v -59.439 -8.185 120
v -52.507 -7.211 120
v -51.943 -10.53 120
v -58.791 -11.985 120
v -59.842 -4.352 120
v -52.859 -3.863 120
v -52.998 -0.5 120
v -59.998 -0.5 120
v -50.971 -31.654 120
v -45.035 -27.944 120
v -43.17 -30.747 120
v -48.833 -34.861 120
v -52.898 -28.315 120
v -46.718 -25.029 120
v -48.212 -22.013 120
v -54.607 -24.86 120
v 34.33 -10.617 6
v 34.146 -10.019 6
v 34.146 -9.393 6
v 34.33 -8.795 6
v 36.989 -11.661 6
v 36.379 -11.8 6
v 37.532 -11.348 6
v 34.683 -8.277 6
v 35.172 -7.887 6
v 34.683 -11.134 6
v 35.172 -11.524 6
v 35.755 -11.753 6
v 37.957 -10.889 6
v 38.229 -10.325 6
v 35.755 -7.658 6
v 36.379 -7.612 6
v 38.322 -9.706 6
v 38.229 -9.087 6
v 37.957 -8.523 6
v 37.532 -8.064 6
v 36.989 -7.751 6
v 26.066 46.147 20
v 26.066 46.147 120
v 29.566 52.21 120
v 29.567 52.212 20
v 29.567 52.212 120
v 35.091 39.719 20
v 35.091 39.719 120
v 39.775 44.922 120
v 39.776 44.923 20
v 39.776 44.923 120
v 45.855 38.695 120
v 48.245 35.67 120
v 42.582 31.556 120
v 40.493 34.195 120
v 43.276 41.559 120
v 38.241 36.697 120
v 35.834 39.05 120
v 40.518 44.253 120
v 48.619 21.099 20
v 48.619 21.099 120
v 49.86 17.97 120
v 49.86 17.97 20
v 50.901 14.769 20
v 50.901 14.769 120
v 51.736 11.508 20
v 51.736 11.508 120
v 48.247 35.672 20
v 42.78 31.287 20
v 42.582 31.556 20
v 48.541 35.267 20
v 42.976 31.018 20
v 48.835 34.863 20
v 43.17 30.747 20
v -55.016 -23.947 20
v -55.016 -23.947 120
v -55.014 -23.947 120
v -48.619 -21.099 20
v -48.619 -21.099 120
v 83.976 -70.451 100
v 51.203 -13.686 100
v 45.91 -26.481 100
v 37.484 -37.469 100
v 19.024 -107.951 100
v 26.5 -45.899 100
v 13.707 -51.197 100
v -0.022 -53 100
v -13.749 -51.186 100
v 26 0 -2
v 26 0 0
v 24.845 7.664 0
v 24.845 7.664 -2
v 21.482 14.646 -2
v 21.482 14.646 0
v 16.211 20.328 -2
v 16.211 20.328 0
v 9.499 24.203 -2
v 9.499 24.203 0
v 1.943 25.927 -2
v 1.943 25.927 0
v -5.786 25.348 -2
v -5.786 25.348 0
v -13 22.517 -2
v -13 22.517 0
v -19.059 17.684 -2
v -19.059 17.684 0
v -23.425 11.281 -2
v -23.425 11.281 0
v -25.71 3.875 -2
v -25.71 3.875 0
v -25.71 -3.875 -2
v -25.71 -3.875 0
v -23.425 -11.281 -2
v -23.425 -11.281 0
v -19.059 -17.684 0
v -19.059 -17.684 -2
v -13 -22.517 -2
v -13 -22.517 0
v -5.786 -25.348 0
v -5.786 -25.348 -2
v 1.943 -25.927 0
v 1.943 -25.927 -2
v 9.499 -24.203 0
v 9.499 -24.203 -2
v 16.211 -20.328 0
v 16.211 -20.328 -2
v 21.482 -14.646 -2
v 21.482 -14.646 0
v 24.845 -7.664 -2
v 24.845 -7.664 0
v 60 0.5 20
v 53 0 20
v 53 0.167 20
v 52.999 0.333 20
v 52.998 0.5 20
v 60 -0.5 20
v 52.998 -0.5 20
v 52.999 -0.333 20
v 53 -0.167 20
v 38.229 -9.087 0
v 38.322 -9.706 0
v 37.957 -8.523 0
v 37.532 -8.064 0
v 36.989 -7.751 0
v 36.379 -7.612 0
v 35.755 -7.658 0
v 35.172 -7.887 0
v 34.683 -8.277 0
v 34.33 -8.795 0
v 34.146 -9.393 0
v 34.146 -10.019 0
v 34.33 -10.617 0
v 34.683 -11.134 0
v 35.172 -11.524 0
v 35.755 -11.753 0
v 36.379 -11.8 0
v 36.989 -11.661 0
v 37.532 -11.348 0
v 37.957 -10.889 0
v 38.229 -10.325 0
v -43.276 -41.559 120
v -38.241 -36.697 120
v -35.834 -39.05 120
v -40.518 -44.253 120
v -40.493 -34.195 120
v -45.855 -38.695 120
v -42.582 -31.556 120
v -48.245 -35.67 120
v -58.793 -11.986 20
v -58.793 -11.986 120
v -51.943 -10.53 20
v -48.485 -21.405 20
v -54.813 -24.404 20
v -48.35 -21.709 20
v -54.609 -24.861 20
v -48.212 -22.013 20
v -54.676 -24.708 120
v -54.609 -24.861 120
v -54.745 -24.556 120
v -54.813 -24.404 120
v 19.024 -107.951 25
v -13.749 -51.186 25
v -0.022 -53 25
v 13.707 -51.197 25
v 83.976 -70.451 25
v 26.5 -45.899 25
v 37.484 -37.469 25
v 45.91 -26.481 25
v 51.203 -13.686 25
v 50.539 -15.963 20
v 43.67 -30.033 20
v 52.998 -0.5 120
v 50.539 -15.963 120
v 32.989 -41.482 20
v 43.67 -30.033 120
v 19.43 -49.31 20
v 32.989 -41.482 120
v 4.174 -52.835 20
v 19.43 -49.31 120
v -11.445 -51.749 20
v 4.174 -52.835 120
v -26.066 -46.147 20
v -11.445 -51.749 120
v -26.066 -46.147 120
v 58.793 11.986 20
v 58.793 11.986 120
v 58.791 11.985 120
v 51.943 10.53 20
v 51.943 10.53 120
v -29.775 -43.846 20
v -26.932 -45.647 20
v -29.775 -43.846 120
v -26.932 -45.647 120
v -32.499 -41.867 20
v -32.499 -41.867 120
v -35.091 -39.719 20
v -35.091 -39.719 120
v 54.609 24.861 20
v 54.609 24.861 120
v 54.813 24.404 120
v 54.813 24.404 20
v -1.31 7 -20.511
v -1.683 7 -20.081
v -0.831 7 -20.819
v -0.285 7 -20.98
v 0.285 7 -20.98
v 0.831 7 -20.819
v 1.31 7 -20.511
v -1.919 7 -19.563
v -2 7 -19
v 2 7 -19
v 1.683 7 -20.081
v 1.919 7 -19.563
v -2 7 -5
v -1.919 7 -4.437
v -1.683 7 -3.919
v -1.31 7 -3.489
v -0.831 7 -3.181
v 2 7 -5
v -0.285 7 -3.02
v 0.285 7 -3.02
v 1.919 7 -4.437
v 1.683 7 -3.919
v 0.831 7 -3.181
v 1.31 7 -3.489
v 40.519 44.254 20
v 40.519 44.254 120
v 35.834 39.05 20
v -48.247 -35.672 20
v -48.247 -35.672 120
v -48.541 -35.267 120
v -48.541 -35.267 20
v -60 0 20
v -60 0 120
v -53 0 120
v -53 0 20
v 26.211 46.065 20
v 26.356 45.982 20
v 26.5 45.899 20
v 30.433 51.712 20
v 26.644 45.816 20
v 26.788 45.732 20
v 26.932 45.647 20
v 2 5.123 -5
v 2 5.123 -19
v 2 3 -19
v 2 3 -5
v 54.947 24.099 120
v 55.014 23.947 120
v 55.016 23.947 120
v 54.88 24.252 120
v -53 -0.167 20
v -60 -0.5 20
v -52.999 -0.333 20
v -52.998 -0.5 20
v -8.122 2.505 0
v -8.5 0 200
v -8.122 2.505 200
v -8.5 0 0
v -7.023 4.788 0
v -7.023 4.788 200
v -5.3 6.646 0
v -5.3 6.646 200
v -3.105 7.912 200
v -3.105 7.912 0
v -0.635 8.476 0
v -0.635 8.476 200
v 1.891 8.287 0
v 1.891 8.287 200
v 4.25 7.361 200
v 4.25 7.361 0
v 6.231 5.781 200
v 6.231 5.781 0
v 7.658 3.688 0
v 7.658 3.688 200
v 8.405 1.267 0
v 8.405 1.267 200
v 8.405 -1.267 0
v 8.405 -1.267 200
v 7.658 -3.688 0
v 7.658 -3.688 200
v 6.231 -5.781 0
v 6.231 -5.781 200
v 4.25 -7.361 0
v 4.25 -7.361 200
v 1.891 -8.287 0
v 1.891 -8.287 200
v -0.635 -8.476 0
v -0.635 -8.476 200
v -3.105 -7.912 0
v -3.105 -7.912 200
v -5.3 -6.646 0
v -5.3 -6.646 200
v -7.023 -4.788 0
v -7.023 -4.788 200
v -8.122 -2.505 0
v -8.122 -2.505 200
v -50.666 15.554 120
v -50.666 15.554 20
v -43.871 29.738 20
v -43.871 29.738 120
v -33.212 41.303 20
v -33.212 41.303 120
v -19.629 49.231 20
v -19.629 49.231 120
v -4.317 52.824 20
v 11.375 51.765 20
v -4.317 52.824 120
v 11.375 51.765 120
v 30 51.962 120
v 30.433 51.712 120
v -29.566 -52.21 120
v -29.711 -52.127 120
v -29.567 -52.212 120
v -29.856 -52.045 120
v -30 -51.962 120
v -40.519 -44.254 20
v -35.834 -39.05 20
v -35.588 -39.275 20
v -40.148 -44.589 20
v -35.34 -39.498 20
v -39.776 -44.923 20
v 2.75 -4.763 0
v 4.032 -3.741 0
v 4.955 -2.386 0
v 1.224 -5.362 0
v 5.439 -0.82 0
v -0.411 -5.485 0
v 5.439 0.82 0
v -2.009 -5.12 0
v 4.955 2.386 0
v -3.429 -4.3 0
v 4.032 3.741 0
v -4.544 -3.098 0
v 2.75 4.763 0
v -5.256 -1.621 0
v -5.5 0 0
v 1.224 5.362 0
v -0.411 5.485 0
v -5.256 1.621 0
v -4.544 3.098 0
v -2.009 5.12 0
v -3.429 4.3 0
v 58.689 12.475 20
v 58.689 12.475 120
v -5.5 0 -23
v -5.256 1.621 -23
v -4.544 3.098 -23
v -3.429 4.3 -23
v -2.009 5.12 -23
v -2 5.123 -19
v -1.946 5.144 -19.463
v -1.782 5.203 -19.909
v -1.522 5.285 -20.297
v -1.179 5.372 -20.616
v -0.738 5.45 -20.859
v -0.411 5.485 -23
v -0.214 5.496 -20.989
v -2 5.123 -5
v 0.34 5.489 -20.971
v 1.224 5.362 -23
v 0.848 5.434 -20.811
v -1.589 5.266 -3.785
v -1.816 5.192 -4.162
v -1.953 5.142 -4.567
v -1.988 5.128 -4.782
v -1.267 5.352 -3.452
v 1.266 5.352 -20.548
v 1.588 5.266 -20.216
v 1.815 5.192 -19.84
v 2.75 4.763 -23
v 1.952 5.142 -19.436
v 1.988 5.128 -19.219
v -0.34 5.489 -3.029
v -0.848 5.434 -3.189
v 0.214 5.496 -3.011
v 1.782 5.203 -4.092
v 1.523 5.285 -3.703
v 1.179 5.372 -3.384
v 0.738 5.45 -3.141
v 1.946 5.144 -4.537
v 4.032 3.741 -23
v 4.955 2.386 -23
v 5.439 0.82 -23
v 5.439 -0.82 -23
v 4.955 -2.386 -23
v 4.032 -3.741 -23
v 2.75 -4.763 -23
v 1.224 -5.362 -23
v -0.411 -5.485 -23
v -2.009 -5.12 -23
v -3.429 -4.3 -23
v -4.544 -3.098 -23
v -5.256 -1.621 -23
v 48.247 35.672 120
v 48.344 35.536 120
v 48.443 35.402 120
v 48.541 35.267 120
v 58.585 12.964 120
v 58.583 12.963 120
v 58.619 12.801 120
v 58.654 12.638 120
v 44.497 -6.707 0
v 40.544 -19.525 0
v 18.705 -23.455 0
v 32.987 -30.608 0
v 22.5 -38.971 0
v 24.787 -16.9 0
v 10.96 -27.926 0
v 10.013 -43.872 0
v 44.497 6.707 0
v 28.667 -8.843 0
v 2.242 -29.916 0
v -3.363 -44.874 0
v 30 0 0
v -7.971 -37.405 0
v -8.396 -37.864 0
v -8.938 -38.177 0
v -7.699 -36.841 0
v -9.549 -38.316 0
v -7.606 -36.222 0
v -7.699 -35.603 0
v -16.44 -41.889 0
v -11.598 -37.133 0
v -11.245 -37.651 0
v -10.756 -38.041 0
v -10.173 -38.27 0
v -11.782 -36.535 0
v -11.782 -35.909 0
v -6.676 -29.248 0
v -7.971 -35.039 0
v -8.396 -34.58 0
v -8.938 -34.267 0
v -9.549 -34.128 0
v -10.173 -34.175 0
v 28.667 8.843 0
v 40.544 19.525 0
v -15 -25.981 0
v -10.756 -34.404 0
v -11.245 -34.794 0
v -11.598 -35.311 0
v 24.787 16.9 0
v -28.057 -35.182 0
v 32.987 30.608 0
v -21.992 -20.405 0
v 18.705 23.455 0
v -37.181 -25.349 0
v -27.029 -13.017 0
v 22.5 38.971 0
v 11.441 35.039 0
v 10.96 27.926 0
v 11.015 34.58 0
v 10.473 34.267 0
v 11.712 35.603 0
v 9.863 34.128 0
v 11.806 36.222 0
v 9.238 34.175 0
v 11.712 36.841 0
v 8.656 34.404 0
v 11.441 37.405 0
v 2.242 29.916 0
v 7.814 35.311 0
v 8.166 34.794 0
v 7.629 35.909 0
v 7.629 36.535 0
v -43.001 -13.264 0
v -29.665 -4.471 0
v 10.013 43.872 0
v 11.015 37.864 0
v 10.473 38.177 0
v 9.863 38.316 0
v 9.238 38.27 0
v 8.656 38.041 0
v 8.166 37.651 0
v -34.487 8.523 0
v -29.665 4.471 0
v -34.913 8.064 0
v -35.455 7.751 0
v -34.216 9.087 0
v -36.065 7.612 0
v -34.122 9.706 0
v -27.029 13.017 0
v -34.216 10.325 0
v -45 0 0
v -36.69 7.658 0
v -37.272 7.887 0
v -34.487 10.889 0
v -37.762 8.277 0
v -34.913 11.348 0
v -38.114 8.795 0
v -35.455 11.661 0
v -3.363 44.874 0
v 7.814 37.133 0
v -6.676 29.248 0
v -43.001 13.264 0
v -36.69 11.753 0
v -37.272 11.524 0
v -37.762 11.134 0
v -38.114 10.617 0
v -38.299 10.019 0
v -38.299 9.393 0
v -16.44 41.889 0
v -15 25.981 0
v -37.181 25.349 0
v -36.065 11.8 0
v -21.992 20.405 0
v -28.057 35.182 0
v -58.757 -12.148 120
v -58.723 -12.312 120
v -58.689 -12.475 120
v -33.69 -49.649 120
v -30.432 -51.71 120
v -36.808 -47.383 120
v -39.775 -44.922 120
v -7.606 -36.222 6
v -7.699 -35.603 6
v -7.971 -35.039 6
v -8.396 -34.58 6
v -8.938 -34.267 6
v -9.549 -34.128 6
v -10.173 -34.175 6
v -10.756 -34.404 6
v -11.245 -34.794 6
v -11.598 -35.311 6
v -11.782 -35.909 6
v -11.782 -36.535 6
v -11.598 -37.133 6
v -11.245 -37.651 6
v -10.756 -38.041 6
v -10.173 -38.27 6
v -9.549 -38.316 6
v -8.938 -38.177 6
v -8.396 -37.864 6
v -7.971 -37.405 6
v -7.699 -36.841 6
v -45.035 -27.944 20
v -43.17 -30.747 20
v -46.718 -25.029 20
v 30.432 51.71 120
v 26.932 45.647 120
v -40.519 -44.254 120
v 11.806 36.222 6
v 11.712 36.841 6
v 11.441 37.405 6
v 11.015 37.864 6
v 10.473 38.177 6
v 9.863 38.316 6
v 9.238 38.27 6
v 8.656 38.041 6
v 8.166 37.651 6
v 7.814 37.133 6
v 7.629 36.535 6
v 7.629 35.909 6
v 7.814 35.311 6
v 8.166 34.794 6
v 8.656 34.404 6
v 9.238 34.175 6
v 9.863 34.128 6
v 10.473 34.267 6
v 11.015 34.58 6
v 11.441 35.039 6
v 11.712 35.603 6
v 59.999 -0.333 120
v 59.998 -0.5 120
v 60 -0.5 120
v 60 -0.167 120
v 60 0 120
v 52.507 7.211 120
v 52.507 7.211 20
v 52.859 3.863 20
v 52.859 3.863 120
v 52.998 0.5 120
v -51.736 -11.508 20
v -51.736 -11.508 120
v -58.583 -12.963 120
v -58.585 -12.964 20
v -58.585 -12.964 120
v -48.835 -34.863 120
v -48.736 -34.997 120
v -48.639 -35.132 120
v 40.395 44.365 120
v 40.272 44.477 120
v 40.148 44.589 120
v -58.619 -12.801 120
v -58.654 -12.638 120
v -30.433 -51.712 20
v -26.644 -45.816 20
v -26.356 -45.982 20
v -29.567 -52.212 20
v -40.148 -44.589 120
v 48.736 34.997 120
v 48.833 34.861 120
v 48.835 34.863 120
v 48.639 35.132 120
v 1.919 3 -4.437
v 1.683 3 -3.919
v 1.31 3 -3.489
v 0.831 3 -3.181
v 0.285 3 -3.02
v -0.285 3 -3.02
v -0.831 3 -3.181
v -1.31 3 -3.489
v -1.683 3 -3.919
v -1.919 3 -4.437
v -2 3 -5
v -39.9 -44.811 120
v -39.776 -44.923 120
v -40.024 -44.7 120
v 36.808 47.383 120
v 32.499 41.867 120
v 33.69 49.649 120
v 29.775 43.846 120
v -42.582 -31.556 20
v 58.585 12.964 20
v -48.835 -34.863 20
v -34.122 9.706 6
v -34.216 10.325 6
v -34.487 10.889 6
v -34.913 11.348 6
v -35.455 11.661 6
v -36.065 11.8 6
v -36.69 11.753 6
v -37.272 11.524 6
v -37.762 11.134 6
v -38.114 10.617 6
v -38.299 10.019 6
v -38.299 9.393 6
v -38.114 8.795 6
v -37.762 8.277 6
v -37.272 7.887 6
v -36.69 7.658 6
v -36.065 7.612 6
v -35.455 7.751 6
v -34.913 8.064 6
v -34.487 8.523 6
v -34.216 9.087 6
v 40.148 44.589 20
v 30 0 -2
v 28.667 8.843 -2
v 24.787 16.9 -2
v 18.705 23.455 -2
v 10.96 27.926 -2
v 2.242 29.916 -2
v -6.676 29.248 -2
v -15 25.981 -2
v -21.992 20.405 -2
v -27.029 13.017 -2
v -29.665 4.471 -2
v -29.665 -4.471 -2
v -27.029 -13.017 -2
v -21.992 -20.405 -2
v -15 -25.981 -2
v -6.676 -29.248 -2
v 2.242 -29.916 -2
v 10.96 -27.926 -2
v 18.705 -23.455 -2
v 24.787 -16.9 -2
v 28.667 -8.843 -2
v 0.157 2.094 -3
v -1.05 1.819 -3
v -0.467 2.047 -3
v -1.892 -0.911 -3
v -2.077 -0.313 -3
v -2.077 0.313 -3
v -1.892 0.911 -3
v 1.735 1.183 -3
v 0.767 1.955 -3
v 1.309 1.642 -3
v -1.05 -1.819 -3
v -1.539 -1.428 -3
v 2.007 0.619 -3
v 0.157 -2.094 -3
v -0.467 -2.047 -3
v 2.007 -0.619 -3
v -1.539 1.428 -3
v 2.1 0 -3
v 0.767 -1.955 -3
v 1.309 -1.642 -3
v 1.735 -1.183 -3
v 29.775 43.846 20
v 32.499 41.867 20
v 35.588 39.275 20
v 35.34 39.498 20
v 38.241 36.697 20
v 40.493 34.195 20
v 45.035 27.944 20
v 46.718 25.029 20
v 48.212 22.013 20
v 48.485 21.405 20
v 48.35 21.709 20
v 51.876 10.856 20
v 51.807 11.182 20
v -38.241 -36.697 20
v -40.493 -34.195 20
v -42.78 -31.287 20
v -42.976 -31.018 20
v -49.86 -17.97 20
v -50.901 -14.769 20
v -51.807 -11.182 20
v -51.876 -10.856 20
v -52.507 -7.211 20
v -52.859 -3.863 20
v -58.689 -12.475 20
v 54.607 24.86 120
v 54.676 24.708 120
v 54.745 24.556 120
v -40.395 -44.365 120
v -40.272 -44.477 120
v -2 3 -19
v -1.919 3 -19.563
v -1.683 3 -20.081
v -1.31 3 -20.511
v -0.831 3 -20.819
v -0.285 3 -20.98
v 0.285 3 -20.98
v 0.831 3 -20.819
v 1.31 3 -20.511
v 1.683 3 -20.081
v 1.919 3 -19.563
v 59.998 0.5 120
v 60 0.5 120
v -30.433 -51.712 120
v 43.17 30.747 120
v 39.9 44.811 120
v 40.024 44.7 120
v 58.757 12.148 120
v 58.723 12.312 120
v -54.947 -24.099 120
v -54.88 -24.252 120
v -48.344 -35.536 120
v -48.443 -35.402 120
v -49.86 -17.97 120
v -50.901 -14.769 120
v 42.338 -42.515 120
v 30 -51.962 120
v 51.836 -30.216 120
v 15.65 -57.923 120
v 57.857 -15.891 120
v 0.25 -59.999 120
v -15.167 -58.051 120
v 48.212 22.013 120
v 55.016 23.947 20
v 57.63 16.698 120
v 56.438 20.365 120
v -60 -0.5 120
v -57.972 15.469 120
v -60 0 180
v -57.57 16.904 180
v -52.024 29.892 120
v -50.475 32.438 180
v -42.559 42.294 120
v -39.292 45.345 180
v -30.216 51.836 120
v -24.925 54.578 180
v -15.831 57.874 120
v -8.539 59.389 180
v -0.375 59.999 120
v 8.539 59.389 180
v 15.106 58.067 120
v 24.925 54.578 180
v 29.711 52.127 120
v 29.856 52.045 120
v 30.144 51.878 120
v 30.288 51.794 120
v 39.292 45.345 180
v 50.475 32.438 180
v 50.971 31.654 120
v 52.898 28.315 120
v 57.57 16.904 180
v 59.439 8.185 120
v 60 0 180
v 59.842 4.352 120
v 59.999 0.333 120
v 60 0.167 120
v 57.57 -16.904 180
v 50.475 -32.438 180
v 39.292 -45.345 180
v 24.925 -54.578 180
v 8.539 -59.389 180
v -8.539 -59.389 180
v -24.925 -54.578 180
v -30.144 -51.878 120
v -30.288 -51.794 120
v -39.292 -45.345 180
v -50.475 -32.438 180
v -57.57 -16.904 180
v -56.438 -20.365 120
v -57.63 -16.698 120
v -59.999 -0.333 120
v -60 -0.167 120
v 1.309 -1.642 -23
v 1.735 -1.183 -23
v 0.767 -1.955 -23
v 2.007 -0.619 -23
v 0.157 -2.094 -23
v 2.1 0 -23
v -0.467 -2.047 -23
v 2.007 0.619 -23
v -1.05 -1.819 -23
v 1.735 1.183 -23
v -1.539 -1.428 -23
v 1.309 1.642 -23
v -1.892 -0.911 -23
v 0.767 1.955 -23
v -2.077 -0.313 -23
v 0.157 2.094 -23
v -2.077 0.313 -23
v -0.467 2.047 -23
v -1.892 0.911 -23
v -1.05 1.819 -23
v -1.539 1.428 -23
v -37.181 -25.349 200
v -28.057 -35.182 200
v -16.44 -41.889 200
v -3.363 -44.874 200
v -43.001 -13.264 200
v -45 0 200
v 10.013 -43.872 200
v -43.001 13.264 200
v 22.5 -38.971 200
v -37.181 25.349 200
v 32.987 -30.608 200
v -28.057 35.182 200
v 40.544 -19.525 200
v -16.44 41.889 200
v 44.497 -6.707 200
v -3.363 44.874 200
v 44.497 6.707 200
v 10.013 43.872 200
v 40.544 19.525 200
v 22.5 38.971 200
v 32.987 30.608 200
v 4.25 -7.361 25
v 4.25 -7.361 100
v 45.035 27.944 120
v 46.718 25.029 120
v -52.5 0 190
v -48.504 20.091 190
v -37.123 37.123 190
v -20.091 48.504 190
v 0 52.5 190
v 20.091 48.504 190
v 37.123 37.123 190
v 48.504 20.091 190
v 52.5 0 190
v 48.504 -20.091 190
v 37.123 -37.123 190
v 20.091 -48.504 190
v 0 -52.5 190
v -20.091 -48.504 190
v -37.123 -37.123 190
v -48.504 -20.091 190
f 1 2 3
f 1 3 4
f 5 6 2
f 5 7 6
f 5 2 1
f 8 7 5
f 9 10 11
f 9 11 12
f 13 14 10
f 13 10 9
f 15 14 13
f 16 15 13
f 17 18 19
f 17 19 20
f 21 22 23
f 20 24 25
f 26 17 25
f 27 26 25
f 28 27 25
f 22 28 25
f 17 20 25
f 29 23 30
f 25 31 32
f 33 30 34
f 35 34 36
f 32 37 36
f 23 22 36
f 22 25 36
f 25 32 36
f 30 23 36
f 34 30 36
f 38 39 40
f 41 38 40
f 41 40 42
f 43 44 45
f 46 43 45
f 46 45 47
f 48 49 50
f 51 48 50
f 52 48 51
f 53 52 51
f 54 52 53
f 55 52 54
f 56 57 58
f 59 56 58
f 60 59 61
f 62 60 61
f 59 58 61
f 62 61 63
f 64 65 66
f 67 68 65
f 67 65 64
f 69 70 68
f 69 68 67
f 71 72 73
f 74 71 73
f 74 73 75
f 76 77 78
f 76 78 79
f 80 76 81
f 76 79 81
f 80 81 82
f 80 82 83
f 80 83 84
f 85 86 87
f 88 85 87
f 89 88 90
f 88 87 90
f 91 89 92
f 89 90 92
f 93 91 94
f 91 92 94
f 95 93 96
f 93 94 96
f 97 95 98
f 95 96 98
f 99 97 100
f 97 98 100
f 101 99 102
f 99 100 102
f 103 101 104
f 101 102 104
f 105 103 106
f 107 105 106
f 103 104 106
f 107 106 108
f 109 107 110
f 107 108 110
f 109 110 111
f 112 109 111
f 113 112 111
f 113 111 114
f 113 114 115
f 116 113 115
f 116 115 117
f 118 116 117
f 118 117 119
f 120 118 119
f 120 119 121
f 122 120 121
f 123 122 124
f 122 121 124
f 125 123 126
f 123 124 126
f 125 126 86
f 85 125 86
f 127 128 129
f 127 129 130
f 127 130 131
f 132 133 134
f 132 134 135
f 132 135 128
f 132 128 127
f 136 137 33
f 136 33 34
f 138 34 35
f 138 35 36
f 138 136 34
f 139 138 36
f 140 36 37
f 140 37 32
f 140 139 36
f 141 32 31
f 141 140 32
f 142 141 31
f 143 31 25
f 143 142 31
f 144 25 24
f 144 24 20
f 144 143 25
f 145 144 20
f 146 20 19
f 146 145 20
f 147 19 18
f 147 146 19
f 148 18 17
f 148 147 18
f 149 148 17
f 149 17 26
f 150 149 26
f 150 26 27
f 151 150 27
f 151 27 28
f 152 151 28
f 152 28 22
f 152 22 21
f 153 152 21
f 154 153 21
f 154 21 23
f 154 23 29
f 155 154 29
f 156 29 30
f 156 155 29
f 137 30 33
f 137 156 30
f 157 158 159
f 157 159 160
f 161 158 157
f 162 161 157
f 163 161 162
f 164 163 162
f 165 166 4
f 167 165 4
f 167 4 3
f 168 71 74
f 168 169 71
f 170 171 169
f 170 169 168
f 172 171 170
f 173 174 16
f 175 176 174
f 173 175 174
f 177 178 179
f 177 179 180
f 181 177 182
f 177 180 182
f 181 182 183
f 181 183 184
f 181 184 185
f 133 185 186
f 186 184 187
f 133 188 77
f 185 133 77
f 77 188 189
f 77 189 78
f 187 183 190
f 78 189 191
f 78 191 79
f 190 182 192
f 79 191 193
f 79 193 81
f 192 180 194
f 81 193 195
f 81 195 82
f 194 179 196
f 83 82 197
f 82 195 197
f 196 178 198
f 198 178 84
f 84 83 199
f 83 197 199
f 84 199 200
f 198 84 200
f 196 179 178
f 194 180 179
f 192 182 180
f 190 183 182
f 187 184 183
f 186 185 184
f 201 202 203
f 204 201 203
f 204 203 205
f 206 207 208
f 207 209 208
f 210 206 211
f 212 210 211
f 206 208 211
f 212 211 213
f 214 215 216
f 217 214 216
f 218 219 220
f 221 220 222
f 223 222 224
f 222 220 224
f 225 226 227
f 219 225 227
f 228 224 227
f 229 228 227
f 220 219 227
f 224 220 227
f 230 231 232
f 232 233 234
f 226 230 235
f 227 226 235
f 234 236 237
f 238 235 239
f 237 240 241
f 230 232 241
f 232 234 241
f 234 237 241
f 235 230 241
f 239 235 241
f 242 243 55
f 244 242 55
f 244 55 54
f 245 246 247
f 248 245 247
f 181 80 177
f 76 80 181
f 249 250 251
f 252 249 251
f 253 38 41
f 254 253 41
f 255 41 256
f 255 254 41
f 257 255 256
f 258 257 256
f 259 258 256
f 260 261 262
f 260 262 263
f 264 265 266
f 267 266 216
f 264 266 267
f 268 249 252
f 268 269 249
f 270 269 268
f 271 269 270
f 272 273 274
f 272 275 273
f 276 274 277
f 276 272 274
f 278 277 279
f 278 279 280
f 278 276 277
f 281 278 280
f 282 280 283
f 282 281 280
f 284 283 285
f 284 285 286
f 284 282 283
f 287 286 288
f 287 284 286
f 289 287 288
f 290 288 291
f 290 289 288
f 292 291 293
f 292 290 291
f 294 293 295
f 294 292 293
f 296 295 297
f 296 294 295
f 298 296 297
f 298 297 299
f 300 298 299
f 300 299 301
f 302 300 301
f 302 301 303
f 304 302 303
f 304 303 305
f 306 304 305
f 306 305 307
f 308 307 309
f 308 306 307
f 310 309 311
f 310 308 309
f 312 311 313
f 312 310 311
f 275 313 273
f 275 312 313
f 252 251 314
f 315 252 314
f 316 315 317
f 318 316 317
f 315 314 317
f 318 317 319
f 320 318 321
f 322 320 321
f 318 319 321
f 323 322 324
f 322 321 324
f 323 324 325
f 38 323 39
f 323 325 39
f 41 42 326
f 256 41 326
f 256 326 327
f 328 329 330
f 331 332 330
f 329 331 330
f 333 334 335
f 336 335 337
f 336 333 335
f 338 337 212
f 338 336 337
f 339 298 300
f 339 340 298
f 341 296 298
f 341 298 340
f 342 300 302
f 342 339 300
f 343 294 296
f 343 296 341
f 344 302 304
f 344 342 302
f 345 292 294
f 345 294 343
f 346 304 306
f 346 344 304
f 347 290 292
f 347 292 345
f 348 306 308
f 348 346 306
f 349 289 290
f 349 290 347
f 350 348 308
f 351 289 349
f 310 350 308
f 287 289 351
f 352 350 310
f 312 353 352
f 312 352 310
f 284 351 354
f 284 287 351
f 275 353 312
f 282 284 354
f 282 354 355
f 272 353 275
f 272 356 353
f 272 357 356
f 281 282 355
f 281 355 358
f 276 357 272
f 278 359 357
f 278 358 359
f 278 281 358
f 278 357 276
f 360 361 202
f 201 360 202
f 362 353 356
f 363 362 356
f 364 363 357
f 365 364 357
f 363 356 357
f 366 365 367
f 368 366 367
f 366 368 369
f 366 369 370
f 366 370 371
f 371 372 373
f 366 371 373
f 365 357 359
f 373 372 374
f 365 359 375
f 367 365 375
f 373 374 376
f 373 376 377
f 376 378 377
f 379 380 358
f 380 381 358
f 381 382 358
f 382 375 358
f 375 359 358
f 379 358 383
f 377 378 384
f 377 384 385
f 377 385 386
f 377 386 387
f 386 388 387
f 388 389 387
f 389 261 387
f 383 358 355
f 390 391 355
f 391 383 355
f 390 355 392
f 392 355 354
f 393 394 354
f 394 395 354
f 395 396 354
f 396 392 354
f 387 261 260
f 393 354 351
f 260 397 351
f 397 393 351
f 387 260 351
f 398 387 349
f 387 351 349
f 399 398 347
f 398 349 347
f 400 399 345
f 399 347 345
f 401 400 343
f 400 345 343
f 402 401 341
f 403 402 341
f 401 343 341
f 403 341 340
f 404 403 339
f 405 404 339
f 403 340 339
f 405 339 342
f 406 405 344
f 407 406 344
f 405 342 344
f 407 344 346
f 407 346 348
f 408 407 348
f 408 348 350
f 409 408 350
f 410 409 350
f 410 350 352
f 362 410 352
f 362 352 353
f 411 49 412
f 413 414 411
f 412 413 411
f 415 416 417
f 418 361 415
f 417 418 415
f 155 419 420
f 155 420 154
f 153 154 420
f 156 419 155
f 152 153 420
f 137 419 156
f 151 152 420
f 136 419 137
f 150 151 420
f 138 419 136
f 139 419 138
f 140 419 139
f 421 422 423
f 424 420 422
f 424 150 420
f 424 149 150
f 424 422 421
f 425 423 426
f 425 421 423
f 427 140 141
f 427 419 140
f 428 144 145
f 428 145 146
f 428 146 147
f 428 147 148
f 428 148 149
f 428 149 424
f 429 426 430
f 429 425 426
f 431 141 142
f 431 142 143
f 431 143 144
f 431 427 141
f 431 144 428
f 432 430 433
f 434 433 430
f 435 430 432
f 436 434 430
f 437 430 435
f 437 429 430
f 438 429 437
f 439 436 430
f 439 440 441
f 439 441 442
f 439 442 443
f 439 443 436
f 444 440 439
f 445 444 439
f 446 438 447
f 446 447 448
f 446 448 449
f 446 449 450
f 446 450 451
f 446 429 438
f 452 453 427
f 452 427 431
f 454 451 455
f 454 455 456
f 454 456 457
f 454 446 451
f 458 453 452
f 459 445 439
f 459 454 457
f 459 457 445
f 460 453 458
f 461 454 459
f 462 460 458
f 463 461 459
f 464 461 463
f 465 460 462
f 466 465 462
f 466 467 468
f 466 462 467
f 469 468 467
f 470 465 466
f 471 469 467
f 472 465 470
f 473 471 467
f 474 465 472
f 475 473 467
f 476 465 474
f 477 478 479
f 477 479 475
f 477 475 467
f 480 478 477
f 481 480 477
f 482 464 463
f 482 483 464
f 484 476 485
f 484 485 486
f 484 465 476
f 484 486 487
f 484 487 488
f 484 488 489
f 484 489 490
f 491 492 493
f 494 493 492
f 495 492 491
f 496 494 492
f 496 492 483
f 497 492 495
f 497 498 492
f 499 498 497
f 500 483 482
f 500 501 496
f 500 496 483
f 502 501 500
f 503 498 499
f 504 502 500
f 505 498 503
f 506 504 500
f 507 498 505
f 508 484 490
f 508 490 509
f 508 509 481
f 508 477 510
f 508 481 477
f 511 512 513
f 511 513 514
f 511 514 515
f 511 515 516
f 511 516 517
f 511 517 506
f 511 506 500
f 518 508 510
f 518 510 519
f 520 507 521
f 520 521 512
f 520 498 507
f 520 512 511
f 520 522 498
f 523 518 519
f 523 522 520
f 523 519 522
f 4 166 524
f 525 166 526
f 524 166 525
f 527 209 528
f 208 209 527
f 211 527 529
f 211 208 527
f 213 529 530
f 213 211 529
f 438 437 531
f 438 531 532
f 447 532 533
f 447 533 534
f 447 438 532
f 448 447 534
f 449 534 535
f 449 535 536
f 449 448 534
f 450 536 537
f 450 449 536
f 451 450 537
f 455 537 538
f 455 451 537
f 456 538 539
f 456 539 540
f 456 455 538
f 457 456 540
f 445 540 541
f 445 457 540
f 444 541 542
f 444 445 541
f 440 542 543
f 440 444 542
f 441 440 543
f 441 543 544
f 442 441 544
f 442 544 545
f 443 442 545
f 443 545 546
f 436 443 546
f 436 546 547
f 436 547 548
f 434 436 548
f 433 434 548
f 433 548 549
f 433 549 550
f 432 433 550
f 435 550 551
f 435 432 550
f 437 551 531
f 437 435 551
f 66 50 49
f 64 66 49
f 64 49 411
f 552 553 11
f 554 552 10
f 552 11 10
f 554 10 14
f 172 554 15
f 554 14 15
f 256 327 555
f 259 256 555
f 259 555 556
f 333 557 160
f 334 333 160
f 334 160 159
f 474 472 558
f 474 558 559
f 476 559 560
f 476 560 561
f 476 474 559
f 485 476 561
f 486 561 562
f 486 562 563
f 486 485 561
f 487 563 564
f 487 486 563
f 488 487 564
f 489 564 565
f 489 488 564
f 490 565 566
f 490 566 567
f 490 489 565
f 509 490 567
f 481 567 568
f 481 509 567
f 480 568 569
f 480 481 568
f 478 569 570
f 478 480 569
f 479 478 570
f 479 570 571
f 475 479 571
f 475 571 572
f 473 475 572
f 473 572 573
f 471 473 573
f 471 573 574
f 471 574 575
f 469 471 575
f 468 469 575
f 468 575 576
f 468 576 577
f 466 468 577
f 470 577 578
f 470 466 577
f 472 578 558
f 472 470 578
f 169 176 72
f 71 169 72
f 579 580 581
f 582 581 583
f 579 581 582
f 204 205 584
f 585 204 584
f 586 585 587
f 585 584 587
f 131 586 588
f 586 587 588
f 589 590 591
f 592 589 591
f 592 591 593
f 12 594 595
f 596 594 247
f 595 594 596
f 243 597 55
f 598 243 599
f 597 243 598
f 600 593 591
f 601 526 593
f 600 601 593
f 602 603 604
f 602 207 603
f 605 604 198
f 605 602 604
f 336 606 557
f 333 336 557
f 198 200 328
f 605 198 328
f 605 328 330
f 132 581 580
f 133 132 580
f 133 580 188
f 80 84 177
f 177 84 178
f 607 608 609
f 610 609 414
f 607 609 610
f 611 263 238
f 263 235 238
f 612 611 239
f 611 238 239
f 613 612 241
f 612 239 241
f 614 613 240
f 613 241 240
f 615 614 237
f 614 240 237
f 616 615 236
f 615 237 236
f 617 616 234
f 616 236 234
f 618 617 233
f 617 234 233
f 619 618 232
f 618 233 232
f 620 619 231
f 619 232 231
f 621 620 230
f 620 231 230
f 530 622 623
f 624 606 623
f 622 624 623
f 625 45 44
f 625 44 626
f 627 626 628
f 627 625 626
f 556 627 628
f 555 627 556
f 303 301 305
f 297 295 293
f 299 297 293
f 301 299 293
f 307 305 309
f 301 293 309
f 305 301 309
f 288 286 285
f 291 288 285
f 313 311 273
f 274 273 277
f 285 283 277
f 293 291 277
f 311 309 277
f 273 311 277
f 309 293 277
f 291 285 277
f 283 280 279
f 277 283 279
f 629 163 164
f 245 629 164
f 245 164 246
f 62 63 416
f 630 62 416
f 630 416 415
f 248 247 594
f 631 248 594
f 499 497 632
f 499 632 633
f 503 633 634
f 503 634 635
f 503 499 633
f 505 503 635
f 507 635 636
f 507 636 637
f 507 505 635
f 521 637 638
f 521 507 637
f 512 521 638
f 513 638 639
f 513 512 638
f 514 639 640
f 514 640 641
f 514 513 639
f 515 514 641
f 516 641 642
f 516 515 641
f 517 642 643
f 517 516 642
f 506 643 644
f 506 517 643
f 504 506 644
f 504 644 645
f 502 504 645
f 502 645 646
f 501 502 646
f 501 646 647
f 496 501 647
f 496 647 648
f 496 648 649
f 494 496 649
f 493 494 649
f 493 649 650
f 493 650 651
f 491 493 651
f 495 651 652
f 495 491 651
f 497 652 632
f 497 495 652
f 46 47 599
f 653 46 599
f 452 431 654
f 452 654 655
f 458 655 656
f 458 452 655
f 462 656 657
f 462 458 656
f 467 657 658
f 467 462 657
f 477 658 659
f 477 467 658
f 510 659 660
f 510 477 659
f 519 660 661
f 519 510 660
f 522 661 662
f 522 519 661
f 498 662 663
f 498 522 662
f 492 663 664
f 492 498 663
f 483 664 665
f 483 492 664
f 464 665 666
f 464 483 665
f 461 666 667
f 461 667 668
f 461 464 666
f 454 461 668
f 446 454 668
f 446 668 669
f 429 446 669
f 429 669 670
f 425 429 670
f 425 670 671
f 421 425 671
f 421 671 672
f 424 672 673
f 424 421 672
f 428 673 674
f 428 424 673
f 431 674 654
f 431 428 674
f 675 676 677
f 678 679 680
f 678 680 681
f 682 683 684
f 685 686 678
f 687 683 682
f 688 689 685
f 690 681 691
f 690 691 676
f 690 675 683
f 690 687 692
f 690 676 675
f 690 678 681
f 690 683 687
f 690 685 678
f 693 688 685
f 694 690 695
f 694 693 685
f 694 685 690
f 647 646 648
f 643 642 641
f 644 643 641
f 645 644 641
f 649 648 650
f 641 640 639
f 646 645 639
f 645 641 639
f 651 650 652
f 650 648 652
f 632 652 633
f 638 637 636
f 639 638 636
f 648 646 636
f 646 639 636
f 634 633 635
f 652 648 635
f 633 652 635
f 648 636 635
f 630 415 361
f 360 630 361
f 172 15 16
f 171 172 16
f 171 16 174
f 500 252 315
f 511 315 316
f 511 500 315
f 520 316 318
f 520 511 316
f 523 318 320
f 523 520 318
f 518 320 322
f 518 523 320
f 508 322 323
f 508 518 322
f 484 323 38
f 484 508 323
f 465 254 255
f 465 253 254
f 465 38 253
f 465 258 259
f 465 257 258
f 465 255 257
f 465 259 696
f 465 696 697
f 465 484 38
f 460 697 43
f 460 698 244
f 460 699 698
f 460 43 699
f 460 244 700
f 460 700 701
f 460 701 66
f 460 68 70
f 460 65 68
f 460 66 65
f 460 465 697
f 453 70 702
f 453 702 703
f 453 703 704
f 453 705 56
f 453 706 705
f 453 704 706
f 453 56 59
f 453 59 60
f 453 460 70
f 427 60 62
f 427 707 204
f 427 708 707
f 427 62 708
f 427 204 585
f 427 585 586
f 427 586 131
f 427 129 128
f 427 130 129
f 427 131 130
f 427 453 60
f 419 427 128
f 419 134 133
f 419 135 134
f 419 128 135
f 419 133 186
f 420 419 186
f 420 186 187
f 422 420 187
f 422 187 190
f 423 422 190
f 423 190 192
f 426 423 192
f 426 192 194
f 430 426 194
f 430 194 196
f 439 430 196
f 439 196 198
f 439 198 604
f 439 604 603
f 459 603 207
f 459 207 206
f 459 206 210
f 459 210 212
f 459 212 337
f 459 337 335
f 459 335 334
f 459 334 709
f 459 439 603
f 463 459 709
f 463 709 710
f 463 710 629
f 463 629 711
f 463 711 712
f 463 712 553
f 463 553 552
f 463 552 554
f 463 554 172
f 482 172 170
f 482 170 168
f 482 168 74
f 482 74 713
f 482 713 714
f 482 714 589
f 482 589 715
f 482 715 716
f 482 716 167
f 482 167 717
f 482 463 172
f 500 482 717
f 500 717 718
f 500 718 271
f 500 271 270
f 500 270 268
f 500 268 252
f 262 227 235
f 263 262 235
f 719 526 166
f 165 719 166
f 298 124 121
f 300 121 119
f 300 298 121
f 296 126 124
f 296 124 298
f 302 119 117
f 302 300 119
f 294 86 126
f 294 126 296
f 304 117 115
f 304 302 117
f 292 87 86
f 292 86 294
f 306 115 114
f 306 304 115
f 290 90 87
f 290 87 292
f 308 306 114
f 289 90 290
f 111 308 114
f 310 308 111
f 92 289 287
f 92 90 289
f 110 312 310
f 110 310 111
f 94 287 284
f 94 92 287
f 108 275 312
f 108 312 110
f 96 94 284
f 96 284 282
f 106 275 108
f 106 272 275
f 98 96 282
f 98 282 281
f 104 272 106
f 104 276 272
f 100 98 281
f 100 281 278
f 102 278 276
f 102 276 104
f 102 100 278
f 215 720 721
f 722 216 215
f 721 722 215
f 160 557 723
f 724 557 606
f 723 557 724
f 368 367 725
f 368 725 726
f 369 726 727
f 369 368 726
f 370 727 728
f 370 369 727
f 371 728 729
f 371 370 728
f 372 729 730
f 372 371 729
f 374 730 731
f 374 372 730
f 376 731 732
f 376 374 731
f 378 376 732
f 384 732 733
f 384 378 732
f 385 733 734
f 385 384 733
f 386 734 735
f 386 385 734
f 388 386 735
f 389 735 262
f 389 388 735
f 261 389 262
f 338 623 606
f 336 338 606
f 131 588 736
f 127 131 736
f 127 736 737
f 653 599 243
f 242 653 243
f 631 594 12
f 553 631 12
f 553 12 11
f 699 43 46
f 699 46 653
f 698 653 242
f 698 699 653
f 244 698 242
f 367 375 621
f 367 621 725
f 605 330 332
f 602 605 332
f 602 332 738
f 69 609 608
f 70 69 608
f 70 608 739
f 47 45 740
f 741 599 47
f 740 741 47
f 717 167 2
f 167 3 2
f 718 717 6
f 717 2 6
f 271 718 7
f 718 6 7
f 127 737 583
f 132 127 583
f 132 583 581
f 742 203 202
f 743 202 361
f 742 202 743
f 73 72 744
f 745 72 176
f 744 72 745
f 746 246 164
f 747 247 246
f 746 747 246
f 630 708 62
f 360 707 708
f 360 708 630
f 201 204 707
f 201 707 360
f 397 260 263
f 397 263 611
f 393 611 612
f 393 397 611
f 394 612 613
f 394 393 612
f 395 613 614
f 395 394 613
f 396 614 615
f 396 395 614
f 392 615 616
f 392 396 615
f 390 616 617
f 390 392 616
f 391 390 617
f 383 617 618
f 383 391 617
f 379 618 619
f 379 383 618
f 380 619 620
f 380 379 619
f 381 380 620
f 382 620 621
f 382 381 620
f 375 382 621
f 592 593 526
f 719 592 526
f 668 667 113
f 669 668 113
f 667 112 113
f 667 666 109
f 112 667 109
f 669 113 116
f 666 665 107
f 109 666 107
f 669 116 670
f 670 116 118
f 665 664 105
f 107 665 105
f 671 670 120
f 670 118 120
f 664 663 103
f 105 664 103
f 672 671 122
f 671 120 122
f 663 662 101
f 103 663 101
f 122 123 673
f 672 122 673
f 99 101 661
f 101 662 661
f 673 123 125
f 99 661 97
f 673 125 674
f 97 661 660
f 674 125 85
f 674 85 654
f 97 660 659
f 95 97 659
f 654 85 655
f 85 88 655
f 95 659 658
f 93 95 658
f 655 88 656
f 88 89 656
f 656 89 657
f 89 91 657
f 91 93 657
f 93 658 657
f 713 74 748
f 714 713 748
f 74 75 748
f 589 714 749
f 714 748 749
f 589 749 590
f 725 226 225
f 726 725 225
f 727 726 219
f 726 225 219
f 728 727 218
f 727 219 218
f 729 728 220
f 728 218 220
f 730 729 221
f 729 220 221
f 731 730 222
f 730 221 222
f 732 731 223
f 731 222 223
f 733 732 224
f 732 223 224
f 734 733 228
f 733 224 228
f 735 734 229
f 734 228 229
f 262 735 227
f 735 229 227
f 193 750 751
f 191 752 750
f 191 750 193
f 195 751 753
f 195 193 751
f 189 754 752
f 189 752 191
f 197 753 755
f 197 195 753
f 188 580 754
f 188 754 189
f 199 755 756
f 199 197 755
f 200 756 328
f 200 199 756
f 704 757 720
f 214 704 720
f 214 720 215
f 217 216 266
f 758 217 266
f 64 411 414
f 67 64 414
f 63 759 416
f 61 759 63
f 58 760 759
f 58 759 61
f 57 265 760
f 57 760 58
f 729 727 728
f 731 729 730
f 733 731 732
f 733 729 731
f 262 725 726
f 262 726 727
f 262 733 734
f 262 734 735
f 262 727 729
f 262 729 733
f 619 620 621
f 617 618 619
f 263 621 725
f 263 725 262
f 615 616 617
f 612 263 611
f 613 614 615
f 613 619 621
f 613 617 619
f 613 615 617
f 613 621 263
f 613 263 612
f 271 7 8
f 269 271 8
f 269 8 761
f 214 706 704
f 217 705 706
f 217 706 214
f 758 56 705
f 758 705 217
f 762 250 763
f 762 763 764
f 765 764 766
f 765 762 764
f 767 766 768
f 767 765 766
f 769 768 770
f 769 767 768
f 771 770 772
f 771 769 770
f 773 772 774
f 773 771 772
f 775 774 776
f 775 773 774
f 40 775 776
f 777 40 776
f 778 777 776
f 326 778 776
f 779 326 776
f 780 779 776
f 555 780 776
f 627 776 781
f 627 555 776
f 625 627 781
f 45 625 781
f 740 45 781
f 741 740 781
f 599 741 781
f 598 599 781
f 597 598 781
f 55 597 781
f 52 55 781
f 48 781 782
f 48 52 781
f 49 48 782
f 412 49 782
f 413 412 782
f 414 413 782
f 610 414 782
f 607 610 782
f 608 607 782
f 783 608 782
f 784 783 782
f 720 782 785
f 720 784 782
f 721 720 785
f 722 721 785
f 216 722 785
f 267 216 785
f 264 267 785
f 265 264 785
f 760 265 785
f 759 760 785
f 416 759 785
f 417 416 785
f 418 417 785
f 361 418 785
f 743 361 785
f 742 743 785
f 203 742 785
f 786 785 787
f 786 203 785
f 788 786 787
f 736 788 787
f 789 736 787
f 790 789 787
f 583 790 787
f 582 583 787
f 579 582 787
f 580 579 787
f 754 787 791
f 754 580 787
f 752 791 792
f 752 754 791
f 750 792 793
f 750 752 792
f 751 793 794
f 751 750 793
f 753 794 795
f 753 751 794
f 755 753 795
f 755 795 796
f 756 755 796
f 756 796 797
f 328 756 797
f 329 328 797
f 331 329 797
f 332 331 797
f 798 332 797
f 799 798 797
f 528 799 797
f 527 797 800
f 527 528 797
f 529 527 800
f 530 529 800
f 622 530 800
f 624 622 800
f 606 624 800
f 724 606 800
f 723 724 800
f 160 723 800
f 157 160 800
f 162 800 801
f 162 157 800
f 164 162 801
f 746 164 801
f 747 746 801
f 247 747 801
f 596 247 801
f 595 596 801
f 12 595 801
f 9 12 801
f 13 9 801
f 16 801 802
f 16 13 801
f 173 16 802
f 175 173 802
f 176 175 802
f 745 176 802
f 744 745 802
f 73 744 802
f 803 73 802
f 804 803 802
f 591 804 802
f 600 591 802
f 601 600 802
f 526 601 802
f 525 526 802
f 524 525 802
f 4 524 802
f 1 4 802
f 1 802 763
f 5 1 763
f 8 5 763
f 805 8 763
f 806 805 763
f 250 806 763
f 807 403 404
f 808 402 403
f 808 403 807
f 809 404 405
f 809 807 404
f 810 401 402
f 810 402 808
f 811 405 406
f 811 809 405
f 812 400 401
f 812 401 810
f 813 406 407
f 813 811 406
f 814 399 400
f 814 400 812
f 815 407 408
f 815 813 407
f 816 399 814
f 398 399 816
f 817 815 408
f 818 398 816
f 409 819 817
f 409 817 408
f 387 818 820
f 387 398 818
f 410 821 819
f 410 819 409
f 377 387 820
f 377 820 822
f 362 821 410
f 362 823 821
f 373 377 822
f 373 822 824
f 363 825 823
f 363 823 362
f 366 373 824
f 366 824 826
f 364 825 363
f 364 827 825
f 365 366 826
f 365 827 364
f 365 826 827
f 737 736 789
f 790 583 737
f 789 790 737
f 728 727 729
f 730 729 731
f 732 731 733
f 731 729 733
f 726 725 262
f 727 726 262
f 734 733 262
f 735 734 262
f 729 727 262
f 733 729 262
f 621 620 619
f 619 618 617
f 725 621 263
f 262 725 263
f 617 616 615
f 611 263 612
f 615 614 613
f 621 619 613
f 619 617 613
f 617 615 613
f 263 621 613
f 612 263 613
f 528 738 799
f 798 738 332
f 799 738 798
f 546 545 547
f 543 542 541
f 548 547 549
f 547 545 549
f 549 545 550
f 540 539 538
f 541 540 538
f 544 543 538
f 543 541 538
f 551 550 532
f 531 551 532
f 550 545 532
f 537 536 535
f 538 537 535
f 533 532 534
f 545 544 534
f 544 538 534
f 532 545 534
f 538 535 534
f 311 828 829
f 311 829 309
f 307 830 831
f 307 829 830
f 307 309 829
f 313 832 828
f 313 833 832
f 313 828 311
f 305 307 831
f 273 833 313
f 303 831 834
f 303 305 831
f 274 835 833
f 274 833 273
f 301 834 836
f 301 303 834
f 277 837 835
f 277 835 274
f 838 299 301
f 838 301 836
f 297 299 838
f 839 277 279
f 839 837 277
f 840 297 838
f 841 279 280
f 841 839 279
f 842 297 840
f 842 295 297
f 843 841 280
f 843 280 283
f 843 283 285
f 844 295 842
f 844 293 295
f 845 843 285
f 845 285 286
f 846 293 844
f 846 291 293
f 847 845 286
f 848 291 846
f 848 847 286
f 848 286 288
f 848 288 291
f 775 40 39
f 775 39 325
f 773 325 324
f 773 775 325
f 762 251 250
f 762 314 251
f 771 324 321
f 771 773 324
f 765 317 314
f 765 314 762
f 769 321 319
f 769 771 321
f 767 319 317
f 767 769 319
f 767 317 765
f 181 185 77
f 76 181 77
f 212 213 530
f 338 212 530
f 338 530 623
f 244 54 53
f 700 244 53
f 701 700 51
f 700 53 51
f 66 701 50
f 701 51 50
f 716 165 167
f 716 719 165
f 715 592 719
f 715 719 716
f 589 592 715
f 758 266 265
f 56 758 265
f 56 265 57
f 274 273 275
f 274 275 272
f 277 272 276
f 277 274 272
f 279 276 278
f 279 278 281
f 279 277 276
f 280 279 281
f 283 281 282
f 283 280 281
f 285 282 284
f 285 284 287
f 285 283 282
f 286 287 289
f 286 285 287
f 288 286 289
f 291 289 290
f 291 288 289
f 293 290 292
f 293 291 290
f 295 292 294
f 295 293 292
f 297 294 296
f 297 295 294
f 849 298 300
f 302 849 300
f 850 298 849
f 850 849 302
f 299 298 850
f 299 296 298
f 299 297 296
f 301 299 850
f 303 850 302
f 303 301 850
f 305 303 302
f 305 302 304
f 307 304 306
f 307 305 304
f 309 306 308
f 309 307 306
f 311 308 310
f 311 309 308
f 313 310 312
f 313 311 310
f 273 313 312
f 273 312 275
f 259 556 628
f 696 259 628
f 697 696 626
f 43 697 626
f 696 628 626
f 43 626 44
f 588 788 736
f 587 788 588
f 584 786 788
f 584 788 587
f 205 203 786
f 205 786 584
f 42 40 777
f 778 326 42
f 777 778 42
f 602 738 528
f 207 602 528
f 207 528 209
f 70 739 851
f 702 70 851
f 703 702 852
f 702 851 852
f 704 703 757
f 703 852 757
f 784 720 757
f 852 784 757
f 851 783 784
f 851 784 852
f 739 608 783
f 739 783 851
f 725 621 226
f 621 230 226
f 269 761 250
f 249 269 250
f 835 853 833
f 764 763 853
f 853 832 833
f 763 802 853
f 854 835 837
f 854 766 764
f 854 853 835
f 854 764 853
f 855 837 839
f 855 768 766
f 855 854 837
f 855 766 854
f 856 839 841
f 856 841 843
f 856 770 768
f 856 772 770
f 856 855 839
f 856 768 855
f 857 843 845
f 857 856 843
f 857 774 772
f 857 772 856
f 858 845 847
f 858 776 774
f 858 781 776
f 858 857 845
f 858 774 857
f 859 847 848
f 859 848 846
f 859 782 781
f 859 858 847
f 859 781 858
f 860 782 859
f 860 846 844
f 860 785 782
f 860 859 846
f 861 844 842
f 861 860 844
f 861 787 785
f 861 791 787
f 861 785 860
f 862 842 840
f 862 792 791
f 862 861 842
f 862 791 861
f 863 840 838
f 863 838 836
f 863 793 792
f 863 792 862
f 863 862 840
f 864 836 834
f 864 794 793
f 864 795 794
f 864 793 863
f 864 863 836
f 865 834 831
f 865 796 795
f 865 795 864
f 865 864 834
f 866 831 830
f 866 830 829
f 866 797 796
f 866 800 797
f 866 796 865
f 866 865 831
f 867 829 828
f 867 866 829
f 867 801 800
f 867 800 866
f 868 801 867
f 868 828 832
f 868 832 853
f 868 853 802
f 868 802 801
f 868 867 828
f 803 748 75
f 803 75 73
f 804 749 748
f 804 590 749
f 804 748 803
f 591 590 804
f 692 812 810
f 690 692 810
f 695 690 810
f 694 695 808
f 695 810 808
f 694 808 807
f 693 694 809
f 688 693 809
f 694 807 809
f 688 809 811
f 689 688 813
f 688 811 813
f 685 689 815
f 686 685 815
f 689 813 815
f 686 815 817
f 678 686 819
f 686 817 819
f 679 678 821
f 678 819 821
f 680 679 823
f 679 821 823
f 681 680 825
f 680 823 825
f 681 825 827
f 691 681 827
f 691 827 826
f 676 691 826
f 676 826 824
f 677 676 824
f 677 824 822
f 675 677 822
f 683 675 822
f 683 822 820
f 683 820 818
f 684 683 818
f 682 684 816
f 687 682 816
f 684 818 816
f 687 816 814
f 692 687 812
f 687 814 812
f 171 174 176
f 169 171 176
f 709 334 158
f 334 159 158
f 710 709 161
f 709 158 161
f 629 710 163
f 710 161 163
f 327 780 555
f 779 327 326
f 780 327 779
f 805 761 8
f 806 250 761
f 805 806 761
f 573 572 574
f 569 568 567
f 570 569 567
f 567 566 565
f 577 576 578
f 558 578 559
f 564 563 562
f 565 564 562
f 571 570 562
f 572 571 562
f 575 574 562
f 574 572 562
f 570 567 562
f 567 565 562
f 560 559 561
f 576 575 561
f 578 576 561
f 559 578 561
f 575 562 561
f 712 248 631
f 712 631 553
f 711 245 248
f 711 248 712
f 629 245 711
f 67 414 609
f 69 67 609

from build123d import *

# Parameters (mm, degrees)
F0_W           = 44.5
F0_H           = 100
F0_W_2         = 8.5
F0_H_2         = 80
F0_W_3         = 5.5
F0_H_3         = 23
F5_DEPTH       = 100
F6_R           = 2.1
F7_DEPTH       = 6
F10_DEPTH      = 44.5
F10_DEPTH_BACK = 50
F13_DEPTH      = 2.5
F6_R_2         = 30
F6_R_3         = 26
F14_DEPTH      = 2
F15_DEPTH      = 1.5
F15_DEPTH_BACK = 2.5
F16_R          = 2.1
F17_DEPTH      = 20


with BuildPart() as f1:
    # F0 (on Front) → F1 (revolve)
    with BuildSketch(Plane.XZ):
        Polygon((-8.5, 0), (-8.5, 20), (-53, 20), (-45, 0), align=None)
        Polygon((-8.5, 120), (-8.5, 200), (-45, 200), (-60, 180), (-60, 120), (-53, 120), align=None)
        with Locations((-30.75, 70)):
            Rectangle(F0_W, F0_H)
    revolve(axis=Axis((0, 0, 100), (0, 0, -1)))

    # F4 (on line) → F5 (join)
    with BuildSketch(Plane(origin=(0, 0, 120), x_dir=(1, 0, 0), z_dir=(0, 0, -1))):
        with BuildLine():
            ThreePointArc((-51.7355599903, 11.507903045), (-51.8418228389, 11.0193196133), (-51.9434716811, 10.5297554443))
            Line((-51.9434716811, 10.5297554443), (-51.8395158357, 11.0188292447))
            Line((-51.8395158357, 11.0188292447), (-51.7355599903, 11.507903045))
        make_face()
        with BuildLine():
            Line((-58.7928118894, 11.9856276487), (-51.9434716811, 10.5297554443))
            ThreePointArc((-51.9434716811, 10.5297554443), (-51.8418228389, 11.0193196133), (-51.7355599903, 11.507903045))
            Line((-51.7355599903, 11.507903045), (-58.5849001986, 12.9637752494))
            Line((-58.5849001986, 12.9637752494), (-58.688856044, 12.4747014491))
            Line((-58.688856044, 12.4747014491), (-58.7928118894, 11.9856276487))
        make_face()
        with BuildLine():
            Line((-48.8349122886, 34.8626066404), (-43.1698852266, 30.7467235575))
            ThreePointArc((-43.1698852266, 30.7467235575), (-42.8779007019, 31.1526183715), (-42.5820999743, 31.5557405519))
            Line((-42.5820999743, 31.5557405519), (-48.2471270364, 35.6716236347))
            Line((-48.2471270364, 35.6716236347), (-48.5410196625, 35.2671151375))
            Line((-48.5410196625, 35.2671151375), (-48.8349122886, 34.8626066404))
        make_face()
        with BuildLine():
            Line((-40.5194087943, 44.2541242255), (-35.8339163764, 39.0503577081))
            ThreePointArc((-35.8339163764, 39.0503577081), (-35.463922137, 39.3866757503), (-35.0907715509, 39.7194883144))
            Line((-35.0907715509, 39.7194883144), (-39.7762639688, 44.9232548318))
            Line((-39.7762639688, 44.9232548318), (-40.1478363815, 44.5886895286))
            Line((-40.1478363815, 44.5886895286), (-40.5194087943, 44.2541242255))
        make_face()
        with BuildLine():
            Line((-30.4330127019, 51.7115242271), (-26.9318334304, 45.6473038424))
            ThreePointArc((-26.9318334304, 45.6473038424), (-26.5, 45.8993464006), (-26.0658080266, 46.1473038424))
            Line((-26.0658080266, 46.1473038424), (-29.5669872981, 52.2115242271))
            Line((-29.5669872981, 52.2115242271), (-30, 51.9615242271))
            Line((-30, 51.9615242271), (-30.4330127019, 51.7115242271))
        make_face()
        with BuildLine():
            ThreePointArc((-48.2123862972, 22.012855506), (-48.4179092551, 21.557042083), (-48.6191229403, 21.0993100483))
            Line((-48.6191229403, 21.0993100483), (-48.4157546188, 21.5560827771))
            Line((-48.4157546188, 21.5560827771), (-48.2123862972, 22.012855506))
        make_face()
        with BuildLine():
            ThreePointArc((-42.5820999743, 31.5557405519), (-42.8779007019, 31.1526183715), (-43.1698852266, 30.7467235575))
            Line((-43.1698852266, 30.7467235575), (-42.8759926005, 31.1512320547))
            Line((-42.8759926005, 31.1512320547), (-42.5820999743, 31.5557405519))
        make_face()
        with BuildLine():
            ThreePointArc((-35.0907715509, 39.7194883144), (-35.463922137, 39.3866757503), (-35.8339163764, 39.0503577081))
            Line((-35.8339163764, 39.0503577081), (-35.4623439637, 39.3849230112))
            Line((-35.4623439637, 39.3849230112), (-35.0907715509, 39.7194883144))
        make_face()
        with BuildLine():
            ThreePointArc((-26.0658080266, 46.1473038424), (-26.5, 45.8993464006), (-26.9318334304, 45.6473038424))
            Line((-26.9318334304, 45.6473038424), (-26.4988207285, 45.8973038424))
            Line((-26.4988207285, 45.8973038424), (-26.0658080266, 46.1473038424))
        make_face()
        with BuildLine():
            Line((-55.0160957801, 23.9474258557), (-48.6191229403, 21.0993100483))
            ThreePointArc((-48.6191229403, 21.0993100483), (-48.4179092551, 21.557042083), (-48.2123862972, 22.012855506))
            Line((-48.2123862972, 22.012855506), (-54.609359137, 24.8609713134))
            Line((-54.609359137, 24.8609713134), (-54.8127274586, 24.4041985845))
            Line((-54.8127274586, 24.4041985845), (-55.0160957801, 23.9474258557))
        make_face()
        with BuildLine():
            Line((-60, 0), (-53, 0))
            ThreePointArc((-53, 0), (-52.999410361, 0.2500027813), (-52.997641457, 0.5))
            Line((-52.997641457, 0.5), (-60, 0.5))
            Line((-60, 0.5), (-60, 0))
        make_face()
        with BuildLine():
            ThreePointArc((35.8339163764, -39.0503577081), (35.463922137, -39.3866757503), (35.0907715509, -39.7194883144))
            Line((35.0907715509, -39.7194883144), (39.7762639688, -44.9232548318))
            Line((39.7762639688, -44.9232548318), (40.1478363815, -44.5886895286))
            Line((40.1478363815, -44.5886895286), (40.5194087943, -44.2541242255))
            Line((40.5194087943, -44.2541242255), (35.8339163764, -39.0503577081))
        make_face()
        with BuildLine():
            ThreePointArc((26.5, -45.8993464006), (26.2831964208, -46.0238371489), (26.0658080266, -46.1473038424))
            Line((26.0658080266, -46.1473038424), (29.5669872981, -52.2115242271))
            Line((29.5669872981, -52.2115242271), (30, -51.9615242271))
            Line((30, -51.9615242271), (30.4330127019, -51.7115242271))
            Line((30.4330127019, -51.7115242271), (26.9318334304, -45.6473038424))
            ThreePointArc((26.9318334304, -45.6473038424), (26.7162139401, -45.7738343675), (26.5, -45.8993464006))
        make_face()
        with BuildLine():
            ThreePointArc((43.1698852266, -30.7467235575), (42.8779007019, -31.1526183715), (42.5820999743, -31.5557405519))
            Line((42.5820999743, -31.5557405519), (48.2471270364, -35.6716236347))
            Line((48.2471270364, -35.6716236347), (48.5410196625, -35.2671151375))
            Line((48.5410196625, -35.2671151375), (48.8349122886, -34.8626066404))
            Line((48.8349122886, -34.8626066404), (43.1698852266, -30.7467235575))
        make_face()
        with BuildLine():
            ThreePointArc((48.6191229403, -21.0993100483), (48.4179092551, -21.557042083), (48.2123862972, -22.012855506))
            Line((48.2123862972, -22.012855506), (54.609359137, -24.8609713134))
            Line((54.609359137, -24.8609713134), (54.8127274586, -24.4041985845))
            Line((54.8127274586, -24.4041985845), (55.0160957801, -23.9474258557))
            Line((55.0160957801, -23.9474258557), (48.6191229403, -21.0993100483))
        make_face()
        with BuildLine():
            ThreePointArc((51.9434716811, -10.5297554443), (51.8418228389, -11.0193196133), (51.7355599903, -11.507903045))
            Line((51.7355599903, -11.507903045), (58.5849001986, -12.9637752494))
            Line((58.5849001986, -12.9637752494), (58.688856044, -12.4747014491))
            Line((58.688856044, -12.4747014491), (58.7928118894, -11.9856276487))
            Line((58.7928118894, -11.9856276487), (51.9434716811, -10.5297554443))
        make_face()
        with BuildLine():
            Line((60, 0.5), (52.997641457, 0.5))
            ThreePointArc((52.997641457, 0.5), (52.999410361, 0.2500027813), (53, 0))
            ThreePointArc((53, 0), (52.999410361, -0.2500027813), (52.997641457, -0.5))
            Line((52.997641457, -0.5), (60, -0.5))
            Line((60, -0.5), (60, 0))
            Line((60, 0), (60, 0.5))
        make_face()
    extrude(amount=F5_DEPTH)

    # F6 (on Top) → F7 (cut)
    with BuildSketch(Plane.XY):
        with Locations((36.2222184858, -9.7057141913)):
            Circle(F6_R)
        with Locations((9.7057141913, 36.2222184858)):
            Circle(F6_R)
        with Locations((-9.7057141913, -36.2222184858)):
            Circle(F6_R)
        with Locations((-36.2222184858, 9.7057141913)):
            Circle(F6_R)
    extrude(amount=F7_DEPTH, mode=Mode.SUBTRACT)

    # F9 (on line) → F10 (join, two sides)
    with BuildSketch(Plane(origin=(26.5, -45.8993464006, 0), x_dir=(0.8660254038, 0.5, 0), z_dir=(0.5, -0.8660254038, 0))) as f10_sk:
        Polygon((37.5, 25), (37.5, 100), (0, 100), (-37.5, 100), (-37.5, 25), align=None)
    extrude(amount=-F10_DEPTH)
    extrude(f10_sk.sketch, amount=F10_DEPTH_BACK)

    # F6 (on Top) → F14 (join)
    with BuildSketch(Plane.XY):
        Circle(F6_R_2)
        Circle(F6_R_3, mode=Mode.SUBTRACT)
    extrude(amount=-F14_DEPTH)


with BuildPart() as f2:
    # F0 (on Front) → F2 (revolve)
    with BuildSketch(Plane.XZ):
        with Locations((-4.25, 160)):
            Rectangle(F0_W_2, F0_H_2)
        with Locations((-4.25, 70)):
            Rectangle(F0_W_2, F0_H)
        Polygon((0, 0), (0, 20), (-8.5, 20), (-8.5, 0), (-5.5, 0), align=None)
        with Locations((-2.75, -11.5)):
            Rectangle(F0_W_3, F0_H_3)
    revolve(axis=Axis((0, 0, 100), (0, 0, -1)))

    # F12 (on offset) → F13 (cut)
    with BuildSketch(Plane.XZ.offset(-5.5)):
        with BuildLine():
            Line((2, -19), (2, -5))
            ThreePointArc((2, -5), (0, -7), (-2, -5))
            Line((-2, -5), (-2, -19))
            ThreePointArc((-2, -19), (0, -17), (2, -19))
        make_face()
        with BuildLine():
            ThreePointArc((-2, -5), (0, -7), (2, -5))
            ThreePointArc((2, -5), (0, -3), (-2, -5))
        make_face()
        with BuildLine():
            ThreePointArc((-2, -19), (0, -21), (2, -19))
            ThreePointArc((2, -19), (0, -17), (-2, -19))
        make_face()
    extrude(amount=F13_DEPTH, mode=Mode.SUBTRACT)

    # F16 (on face) → F17 (cut)
    with BuildSketch(Plane(origin=(0, 0, -23), x_dir=(1, 0, 0), z_dir=(0, 0, -1))):
        Circle(F16_R)
    extrude(amount=-F17_DEPTH, mode=Mode.SUBTRACT)


with BuildPart() as f15:
    # F12 (on offset) → F15 (new body, two sides)
    with BuildSketch(Plane.XZ.offset(-5.5)) as f15_sk:
        with BuildLine():
            Line((2, -19), (2, -5))
            ThreePointArc((2, -5), (0, -7), (-2, -5))
            Line((-2, -5), (-2, -19))
            ThreePointArc((-2, -19), (0, -17), (2, -19))
        make_face()
        with BuildLine():
            ThreePointArc((-2, -5), (0, -7), (2, -5))
            ThreePointArc((2, -5), (0, -3), (-2, -5))
        make_face()
        with BuildLine():
            ThreePointArc((-2, -19), (0, -21), (2, -19))
            ThreePointArc((2, -19), (0, -17), (-2, -19))
        make_face()
    extrude(amount=-F15_DEPTH)
    extrude(f15_sk.sketch, amount=F15_DEPTH_BACK)


solid = Compound([f1.part, f2.part, f15.part])
